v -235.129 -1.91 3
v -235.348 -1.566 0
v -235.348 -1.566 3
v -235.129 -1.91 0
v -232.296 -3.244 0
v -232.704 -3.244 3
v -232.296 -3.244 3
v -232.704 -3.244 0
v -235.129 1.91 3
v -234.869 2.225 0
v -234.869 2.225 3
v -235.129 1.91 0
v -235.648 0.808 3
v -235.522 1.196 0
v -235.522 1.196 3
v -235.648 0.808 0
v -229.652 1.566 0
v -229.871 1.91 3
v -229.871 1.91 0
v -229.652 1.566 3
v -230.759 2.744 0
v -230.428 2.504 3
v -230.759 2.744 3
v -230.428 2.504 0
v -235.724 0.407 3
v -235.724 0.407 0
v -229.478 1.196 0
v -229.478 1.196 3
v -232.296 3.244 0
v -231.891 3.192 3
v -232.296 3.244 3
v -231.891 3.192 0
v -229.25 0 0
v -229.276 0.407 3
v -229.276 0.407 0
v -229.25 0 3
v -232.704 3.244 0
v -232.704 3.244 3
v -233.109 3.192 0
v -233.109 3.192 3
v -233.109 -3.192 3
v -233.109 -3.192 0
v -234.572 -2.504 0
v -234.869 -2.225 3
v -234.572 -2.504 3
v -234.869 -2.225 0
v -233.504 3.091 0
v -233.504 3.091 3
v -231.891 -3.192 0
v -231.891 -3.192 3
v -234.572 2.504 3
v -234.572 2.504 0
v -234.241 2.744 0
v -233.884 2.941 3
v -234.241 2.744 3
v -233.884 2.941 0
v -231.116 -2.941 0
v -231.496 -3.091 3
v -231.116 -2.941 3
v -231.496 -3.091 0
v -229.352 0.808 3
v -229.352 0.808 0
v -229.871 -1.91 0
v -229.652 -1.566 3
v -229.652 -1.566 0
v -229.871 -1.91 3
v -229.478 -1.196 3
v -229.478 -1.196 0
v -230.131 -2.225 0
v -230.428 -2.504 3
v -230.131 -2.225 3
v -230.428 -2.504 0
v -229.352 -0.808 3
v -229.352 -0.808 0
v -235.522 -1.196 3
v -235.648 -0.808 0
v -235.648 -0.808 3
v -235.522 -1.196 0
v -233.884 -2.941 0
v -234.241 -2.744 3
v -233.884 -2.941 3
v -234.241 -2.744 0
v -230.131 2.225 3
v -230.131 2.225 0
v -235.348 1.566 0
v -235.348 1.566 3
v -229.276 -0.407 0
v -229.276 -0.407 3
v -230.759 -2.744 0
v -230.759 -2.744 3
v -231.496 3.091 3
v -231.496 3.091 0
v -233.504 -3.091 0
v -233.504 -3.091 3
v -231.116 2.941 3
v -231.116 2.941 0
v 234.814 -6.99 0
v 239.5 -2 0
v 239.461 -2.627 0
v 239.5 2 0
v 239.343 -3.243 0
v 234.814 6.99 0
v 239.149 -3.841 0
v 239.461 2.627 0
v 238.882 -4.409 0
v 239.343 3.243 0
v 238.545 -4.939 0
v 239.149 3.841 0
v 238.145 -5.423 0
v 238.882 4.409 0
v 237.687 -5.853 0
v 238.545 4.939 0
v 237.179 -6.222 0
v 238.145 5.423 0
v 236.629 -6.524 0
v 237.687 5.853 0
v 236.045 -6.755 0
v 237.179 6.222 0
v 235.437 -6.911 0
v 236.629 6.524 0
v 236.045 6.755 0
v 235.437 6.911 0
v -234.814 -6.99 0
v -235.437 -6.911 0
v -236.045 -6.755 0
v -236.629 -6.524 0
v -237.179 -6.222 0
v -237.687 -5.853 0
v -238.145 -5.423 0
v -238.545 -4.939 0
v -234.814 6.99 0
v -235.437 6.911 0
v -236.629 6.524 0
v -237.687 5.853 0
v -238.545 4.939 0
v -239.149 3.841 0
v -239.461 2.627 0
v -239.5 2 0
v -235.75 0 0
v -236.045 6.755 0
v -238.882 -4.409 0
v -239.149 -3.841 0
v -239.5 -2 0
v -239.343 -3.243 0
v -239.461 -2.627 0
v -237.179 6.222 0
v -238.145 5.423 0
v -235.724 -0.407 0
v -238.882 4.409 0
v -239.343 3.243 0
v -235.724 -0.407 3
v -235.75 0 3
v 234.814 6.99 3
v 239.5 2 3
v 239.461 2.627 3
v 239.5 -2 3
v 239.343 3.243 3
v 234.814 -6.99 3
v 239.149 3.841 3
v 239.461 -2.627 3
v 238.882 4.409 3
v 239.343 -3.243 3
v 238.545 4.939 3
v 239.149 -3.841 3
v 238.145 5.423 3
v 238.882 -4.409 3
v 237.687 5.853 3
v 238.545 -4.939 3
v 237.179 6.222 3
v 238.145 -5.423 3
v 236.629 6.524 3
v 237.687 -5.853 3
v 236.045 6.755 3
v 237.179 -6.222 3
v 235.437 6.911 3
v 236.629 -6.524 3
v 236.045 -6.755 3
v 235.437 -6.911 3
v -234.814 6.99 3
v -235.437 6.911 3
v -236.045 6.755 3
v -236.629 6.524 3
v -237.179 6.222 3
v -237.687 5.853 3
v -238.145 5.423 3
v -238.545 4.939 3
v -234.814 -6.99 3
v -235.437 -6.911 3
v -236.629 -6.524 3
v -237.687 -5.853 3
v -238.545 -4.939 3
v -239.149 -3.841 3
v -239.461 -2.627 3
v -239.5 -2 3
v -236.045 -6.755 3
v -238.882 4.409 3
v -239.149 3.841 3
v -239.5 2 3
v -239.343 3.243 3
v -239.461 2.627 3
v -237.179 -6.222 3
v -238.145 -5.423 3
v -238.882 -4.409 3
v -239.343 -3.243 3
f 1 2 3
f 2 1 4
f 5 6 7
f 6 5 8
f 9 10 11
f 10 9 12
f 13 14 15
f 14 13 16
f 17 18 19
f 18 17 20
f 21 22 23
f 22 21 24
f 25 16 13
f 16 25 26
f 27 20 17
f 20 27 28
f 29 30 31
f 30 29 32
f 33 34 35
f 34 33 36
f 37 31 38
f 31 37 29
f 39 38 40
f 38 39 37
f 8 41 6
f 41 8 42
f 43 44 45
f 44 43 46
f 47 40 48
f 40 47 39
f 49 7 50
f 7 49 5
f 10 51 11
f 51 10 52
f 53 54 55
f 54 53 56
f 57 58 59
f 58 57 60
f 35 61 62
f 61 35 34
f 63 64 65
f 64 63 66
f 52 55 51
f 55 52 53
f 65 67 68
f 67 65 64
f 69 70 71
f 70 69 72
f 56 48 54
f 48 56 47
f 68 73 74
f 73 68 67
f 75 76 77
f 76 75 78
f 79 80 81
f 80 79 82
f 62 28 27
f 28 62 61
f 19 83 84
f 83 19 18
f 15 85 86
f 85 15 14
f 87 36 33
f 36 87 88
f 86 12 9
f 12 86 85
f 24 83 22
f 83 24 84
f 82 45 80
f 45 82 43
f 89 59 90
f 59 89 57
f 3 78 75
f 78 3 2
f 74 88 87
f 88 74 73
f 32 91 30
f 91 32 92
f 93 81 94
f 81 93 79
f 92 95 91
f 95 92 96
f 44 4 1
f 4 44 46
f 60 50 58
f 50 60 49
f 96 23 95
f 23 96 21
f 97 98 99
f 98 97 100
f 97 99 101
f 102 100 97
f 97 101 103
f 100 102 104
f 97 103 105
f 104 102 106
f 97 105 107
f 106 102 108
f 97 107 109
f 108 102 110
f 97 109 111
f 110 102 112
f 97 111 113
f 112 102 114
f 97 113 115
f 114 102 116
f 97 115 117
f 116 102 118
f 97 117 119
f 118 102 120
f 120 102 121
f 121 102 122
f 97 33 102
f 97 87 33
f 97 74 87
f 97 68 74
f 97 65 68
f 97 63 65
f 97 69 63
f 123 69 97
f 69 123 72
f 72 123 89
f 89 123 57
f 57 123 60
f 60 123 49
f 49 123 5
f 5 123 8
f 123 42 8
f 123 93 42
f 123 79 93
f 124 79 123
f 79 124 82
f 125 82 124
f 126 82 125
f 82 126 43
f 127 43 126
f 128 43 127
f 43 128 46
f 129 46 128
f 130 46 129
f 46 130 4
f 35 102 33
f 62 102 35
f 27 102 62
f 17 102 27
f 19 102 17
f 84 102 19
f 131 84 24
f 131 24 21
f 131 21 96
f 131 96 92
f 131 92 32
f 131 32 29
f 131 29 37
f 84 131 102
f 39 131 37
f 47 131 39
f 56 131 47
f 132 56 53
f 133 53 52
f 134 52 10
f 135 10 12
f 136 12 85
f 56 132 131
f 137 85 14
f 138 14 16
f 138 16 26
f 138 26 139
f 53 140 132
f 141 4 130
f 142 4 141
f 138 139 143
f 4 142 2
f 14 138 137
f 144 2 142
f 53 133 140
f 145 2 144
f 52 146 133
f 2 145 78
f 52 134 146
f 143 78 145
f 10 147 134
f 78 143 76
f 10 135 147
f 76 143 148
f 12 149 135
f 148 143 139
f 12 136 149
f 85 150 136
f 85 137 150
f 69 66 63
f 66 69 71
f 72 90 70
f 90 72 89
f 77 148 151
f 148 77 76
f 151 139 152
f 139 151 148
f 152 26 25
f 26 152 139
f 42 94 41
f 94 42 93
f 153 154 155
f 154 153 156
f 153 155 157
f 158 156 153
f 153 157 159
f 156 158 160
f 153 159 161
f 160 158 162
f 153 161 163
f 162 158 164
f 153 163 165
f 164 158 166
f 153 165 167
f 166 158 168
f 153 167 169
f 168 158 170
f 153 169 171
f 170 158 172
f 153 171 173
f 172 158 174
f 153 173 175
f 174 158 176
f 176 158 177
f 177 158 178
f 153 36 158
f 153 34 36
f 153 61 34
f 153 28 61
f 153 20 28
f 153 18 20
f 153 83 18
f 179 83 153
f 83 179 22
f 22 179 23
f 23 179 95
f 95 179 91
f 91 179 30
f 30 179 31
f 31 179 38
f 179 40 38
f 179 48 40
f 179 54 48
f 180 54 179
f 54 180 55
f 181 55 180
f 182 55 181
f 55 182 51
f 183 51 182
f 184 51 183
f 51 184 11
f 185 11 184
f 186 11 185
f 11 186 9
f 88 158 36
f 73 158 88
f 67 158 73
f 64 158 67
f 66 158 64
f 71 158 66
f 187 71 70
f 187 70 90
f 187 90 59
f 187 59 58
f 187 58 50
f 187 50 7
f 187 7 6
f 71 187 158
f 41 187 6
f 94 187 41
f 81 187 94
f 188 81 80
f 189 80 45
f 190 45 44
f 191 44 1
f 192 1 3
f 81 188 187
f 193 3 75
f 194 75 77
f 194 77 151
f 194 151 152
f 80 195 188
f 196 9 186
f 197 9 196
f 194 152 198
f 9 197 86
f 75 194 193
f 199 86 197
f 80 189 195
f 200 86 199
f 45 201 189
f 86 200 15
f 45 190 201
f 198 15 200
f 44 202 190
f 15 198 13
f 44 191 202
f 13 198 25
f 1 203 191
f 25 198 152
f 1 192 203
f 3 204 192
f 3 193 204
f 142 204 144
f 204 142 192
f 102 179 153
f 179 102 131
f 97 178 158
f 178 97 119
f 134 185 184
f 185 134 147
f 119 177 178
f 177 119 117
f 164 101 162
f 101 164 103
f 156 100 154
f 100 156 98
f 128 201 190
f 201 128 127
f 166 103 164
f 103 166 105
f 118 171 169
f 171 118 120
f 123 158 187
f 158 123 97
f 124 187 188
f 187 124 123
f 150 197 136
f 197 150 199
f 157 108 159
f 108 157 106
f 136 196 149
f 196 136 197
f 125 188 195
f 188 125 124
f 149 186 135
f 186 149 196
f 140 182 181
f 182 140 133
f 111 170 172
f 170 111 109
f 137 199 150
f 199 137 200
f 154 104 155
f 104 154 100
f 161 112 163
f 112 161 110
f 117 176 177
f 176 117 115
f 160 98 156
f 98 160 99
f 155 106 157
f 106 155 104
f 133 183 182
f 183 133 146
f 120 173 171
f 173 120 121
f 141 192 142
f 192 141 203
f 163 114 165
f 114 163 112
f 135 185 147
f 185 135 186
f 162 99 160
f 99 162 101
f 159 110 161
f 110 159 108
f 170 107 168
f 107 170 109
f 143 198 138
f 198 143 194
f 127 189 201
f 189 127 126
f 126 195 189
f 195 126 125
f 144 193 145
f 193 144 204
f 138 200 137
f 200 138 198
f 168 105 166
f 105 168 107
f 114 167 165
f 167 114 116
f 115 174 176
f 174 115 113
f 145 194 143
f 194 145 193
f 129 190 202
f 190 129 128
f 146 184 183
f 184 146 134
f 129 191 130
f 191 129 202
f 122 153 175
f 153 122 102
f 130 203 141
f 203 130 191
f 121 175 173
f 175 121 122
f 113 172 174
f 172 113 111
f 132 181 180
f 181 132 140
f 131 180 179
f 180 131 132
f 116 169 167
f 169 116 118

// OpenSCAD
$fn = 50;


difference() {
	union() {
		hull() {
			translate(v = [-234.5000000000, 2.0000000000, 0]) {
				cylinder(h = 3, r = 5);
			}
			translate(v = [234.5000000000, 2.0000000000, 0]) {
				cylinder(h = 3, r = 5);
			}
			translate(v = [-234.5000000000, -2.0000000000, 0]) {
				cylinder(h = 3, r = 5);
			}
			translate(v = [234.5000000000, -2.0000000000, 0]) {
				cylinder(h = 3, r = 5);
			}
		}
	}
	union() {
		translate(v = [-232.5000000000, 0.0000000000, 0]) {
			cylinder(h = 3, r = 3.2500000000);
		}
		translate(v = [-232.5000000000, 0.0000000000, 0]) {
			cylinder(h = 3, r = 1.8000000000);
		}
		translate(v = [-232.5000000000, 0.0000000000, 0]) {
			cylinder(h = 3, r = 1.8000000000);
		}
		translate(v = [-232.5000000000, 0.0000000000, 0]) {
			cylinder(h = 3, r = 1.8000000000);
		}
	}
}
